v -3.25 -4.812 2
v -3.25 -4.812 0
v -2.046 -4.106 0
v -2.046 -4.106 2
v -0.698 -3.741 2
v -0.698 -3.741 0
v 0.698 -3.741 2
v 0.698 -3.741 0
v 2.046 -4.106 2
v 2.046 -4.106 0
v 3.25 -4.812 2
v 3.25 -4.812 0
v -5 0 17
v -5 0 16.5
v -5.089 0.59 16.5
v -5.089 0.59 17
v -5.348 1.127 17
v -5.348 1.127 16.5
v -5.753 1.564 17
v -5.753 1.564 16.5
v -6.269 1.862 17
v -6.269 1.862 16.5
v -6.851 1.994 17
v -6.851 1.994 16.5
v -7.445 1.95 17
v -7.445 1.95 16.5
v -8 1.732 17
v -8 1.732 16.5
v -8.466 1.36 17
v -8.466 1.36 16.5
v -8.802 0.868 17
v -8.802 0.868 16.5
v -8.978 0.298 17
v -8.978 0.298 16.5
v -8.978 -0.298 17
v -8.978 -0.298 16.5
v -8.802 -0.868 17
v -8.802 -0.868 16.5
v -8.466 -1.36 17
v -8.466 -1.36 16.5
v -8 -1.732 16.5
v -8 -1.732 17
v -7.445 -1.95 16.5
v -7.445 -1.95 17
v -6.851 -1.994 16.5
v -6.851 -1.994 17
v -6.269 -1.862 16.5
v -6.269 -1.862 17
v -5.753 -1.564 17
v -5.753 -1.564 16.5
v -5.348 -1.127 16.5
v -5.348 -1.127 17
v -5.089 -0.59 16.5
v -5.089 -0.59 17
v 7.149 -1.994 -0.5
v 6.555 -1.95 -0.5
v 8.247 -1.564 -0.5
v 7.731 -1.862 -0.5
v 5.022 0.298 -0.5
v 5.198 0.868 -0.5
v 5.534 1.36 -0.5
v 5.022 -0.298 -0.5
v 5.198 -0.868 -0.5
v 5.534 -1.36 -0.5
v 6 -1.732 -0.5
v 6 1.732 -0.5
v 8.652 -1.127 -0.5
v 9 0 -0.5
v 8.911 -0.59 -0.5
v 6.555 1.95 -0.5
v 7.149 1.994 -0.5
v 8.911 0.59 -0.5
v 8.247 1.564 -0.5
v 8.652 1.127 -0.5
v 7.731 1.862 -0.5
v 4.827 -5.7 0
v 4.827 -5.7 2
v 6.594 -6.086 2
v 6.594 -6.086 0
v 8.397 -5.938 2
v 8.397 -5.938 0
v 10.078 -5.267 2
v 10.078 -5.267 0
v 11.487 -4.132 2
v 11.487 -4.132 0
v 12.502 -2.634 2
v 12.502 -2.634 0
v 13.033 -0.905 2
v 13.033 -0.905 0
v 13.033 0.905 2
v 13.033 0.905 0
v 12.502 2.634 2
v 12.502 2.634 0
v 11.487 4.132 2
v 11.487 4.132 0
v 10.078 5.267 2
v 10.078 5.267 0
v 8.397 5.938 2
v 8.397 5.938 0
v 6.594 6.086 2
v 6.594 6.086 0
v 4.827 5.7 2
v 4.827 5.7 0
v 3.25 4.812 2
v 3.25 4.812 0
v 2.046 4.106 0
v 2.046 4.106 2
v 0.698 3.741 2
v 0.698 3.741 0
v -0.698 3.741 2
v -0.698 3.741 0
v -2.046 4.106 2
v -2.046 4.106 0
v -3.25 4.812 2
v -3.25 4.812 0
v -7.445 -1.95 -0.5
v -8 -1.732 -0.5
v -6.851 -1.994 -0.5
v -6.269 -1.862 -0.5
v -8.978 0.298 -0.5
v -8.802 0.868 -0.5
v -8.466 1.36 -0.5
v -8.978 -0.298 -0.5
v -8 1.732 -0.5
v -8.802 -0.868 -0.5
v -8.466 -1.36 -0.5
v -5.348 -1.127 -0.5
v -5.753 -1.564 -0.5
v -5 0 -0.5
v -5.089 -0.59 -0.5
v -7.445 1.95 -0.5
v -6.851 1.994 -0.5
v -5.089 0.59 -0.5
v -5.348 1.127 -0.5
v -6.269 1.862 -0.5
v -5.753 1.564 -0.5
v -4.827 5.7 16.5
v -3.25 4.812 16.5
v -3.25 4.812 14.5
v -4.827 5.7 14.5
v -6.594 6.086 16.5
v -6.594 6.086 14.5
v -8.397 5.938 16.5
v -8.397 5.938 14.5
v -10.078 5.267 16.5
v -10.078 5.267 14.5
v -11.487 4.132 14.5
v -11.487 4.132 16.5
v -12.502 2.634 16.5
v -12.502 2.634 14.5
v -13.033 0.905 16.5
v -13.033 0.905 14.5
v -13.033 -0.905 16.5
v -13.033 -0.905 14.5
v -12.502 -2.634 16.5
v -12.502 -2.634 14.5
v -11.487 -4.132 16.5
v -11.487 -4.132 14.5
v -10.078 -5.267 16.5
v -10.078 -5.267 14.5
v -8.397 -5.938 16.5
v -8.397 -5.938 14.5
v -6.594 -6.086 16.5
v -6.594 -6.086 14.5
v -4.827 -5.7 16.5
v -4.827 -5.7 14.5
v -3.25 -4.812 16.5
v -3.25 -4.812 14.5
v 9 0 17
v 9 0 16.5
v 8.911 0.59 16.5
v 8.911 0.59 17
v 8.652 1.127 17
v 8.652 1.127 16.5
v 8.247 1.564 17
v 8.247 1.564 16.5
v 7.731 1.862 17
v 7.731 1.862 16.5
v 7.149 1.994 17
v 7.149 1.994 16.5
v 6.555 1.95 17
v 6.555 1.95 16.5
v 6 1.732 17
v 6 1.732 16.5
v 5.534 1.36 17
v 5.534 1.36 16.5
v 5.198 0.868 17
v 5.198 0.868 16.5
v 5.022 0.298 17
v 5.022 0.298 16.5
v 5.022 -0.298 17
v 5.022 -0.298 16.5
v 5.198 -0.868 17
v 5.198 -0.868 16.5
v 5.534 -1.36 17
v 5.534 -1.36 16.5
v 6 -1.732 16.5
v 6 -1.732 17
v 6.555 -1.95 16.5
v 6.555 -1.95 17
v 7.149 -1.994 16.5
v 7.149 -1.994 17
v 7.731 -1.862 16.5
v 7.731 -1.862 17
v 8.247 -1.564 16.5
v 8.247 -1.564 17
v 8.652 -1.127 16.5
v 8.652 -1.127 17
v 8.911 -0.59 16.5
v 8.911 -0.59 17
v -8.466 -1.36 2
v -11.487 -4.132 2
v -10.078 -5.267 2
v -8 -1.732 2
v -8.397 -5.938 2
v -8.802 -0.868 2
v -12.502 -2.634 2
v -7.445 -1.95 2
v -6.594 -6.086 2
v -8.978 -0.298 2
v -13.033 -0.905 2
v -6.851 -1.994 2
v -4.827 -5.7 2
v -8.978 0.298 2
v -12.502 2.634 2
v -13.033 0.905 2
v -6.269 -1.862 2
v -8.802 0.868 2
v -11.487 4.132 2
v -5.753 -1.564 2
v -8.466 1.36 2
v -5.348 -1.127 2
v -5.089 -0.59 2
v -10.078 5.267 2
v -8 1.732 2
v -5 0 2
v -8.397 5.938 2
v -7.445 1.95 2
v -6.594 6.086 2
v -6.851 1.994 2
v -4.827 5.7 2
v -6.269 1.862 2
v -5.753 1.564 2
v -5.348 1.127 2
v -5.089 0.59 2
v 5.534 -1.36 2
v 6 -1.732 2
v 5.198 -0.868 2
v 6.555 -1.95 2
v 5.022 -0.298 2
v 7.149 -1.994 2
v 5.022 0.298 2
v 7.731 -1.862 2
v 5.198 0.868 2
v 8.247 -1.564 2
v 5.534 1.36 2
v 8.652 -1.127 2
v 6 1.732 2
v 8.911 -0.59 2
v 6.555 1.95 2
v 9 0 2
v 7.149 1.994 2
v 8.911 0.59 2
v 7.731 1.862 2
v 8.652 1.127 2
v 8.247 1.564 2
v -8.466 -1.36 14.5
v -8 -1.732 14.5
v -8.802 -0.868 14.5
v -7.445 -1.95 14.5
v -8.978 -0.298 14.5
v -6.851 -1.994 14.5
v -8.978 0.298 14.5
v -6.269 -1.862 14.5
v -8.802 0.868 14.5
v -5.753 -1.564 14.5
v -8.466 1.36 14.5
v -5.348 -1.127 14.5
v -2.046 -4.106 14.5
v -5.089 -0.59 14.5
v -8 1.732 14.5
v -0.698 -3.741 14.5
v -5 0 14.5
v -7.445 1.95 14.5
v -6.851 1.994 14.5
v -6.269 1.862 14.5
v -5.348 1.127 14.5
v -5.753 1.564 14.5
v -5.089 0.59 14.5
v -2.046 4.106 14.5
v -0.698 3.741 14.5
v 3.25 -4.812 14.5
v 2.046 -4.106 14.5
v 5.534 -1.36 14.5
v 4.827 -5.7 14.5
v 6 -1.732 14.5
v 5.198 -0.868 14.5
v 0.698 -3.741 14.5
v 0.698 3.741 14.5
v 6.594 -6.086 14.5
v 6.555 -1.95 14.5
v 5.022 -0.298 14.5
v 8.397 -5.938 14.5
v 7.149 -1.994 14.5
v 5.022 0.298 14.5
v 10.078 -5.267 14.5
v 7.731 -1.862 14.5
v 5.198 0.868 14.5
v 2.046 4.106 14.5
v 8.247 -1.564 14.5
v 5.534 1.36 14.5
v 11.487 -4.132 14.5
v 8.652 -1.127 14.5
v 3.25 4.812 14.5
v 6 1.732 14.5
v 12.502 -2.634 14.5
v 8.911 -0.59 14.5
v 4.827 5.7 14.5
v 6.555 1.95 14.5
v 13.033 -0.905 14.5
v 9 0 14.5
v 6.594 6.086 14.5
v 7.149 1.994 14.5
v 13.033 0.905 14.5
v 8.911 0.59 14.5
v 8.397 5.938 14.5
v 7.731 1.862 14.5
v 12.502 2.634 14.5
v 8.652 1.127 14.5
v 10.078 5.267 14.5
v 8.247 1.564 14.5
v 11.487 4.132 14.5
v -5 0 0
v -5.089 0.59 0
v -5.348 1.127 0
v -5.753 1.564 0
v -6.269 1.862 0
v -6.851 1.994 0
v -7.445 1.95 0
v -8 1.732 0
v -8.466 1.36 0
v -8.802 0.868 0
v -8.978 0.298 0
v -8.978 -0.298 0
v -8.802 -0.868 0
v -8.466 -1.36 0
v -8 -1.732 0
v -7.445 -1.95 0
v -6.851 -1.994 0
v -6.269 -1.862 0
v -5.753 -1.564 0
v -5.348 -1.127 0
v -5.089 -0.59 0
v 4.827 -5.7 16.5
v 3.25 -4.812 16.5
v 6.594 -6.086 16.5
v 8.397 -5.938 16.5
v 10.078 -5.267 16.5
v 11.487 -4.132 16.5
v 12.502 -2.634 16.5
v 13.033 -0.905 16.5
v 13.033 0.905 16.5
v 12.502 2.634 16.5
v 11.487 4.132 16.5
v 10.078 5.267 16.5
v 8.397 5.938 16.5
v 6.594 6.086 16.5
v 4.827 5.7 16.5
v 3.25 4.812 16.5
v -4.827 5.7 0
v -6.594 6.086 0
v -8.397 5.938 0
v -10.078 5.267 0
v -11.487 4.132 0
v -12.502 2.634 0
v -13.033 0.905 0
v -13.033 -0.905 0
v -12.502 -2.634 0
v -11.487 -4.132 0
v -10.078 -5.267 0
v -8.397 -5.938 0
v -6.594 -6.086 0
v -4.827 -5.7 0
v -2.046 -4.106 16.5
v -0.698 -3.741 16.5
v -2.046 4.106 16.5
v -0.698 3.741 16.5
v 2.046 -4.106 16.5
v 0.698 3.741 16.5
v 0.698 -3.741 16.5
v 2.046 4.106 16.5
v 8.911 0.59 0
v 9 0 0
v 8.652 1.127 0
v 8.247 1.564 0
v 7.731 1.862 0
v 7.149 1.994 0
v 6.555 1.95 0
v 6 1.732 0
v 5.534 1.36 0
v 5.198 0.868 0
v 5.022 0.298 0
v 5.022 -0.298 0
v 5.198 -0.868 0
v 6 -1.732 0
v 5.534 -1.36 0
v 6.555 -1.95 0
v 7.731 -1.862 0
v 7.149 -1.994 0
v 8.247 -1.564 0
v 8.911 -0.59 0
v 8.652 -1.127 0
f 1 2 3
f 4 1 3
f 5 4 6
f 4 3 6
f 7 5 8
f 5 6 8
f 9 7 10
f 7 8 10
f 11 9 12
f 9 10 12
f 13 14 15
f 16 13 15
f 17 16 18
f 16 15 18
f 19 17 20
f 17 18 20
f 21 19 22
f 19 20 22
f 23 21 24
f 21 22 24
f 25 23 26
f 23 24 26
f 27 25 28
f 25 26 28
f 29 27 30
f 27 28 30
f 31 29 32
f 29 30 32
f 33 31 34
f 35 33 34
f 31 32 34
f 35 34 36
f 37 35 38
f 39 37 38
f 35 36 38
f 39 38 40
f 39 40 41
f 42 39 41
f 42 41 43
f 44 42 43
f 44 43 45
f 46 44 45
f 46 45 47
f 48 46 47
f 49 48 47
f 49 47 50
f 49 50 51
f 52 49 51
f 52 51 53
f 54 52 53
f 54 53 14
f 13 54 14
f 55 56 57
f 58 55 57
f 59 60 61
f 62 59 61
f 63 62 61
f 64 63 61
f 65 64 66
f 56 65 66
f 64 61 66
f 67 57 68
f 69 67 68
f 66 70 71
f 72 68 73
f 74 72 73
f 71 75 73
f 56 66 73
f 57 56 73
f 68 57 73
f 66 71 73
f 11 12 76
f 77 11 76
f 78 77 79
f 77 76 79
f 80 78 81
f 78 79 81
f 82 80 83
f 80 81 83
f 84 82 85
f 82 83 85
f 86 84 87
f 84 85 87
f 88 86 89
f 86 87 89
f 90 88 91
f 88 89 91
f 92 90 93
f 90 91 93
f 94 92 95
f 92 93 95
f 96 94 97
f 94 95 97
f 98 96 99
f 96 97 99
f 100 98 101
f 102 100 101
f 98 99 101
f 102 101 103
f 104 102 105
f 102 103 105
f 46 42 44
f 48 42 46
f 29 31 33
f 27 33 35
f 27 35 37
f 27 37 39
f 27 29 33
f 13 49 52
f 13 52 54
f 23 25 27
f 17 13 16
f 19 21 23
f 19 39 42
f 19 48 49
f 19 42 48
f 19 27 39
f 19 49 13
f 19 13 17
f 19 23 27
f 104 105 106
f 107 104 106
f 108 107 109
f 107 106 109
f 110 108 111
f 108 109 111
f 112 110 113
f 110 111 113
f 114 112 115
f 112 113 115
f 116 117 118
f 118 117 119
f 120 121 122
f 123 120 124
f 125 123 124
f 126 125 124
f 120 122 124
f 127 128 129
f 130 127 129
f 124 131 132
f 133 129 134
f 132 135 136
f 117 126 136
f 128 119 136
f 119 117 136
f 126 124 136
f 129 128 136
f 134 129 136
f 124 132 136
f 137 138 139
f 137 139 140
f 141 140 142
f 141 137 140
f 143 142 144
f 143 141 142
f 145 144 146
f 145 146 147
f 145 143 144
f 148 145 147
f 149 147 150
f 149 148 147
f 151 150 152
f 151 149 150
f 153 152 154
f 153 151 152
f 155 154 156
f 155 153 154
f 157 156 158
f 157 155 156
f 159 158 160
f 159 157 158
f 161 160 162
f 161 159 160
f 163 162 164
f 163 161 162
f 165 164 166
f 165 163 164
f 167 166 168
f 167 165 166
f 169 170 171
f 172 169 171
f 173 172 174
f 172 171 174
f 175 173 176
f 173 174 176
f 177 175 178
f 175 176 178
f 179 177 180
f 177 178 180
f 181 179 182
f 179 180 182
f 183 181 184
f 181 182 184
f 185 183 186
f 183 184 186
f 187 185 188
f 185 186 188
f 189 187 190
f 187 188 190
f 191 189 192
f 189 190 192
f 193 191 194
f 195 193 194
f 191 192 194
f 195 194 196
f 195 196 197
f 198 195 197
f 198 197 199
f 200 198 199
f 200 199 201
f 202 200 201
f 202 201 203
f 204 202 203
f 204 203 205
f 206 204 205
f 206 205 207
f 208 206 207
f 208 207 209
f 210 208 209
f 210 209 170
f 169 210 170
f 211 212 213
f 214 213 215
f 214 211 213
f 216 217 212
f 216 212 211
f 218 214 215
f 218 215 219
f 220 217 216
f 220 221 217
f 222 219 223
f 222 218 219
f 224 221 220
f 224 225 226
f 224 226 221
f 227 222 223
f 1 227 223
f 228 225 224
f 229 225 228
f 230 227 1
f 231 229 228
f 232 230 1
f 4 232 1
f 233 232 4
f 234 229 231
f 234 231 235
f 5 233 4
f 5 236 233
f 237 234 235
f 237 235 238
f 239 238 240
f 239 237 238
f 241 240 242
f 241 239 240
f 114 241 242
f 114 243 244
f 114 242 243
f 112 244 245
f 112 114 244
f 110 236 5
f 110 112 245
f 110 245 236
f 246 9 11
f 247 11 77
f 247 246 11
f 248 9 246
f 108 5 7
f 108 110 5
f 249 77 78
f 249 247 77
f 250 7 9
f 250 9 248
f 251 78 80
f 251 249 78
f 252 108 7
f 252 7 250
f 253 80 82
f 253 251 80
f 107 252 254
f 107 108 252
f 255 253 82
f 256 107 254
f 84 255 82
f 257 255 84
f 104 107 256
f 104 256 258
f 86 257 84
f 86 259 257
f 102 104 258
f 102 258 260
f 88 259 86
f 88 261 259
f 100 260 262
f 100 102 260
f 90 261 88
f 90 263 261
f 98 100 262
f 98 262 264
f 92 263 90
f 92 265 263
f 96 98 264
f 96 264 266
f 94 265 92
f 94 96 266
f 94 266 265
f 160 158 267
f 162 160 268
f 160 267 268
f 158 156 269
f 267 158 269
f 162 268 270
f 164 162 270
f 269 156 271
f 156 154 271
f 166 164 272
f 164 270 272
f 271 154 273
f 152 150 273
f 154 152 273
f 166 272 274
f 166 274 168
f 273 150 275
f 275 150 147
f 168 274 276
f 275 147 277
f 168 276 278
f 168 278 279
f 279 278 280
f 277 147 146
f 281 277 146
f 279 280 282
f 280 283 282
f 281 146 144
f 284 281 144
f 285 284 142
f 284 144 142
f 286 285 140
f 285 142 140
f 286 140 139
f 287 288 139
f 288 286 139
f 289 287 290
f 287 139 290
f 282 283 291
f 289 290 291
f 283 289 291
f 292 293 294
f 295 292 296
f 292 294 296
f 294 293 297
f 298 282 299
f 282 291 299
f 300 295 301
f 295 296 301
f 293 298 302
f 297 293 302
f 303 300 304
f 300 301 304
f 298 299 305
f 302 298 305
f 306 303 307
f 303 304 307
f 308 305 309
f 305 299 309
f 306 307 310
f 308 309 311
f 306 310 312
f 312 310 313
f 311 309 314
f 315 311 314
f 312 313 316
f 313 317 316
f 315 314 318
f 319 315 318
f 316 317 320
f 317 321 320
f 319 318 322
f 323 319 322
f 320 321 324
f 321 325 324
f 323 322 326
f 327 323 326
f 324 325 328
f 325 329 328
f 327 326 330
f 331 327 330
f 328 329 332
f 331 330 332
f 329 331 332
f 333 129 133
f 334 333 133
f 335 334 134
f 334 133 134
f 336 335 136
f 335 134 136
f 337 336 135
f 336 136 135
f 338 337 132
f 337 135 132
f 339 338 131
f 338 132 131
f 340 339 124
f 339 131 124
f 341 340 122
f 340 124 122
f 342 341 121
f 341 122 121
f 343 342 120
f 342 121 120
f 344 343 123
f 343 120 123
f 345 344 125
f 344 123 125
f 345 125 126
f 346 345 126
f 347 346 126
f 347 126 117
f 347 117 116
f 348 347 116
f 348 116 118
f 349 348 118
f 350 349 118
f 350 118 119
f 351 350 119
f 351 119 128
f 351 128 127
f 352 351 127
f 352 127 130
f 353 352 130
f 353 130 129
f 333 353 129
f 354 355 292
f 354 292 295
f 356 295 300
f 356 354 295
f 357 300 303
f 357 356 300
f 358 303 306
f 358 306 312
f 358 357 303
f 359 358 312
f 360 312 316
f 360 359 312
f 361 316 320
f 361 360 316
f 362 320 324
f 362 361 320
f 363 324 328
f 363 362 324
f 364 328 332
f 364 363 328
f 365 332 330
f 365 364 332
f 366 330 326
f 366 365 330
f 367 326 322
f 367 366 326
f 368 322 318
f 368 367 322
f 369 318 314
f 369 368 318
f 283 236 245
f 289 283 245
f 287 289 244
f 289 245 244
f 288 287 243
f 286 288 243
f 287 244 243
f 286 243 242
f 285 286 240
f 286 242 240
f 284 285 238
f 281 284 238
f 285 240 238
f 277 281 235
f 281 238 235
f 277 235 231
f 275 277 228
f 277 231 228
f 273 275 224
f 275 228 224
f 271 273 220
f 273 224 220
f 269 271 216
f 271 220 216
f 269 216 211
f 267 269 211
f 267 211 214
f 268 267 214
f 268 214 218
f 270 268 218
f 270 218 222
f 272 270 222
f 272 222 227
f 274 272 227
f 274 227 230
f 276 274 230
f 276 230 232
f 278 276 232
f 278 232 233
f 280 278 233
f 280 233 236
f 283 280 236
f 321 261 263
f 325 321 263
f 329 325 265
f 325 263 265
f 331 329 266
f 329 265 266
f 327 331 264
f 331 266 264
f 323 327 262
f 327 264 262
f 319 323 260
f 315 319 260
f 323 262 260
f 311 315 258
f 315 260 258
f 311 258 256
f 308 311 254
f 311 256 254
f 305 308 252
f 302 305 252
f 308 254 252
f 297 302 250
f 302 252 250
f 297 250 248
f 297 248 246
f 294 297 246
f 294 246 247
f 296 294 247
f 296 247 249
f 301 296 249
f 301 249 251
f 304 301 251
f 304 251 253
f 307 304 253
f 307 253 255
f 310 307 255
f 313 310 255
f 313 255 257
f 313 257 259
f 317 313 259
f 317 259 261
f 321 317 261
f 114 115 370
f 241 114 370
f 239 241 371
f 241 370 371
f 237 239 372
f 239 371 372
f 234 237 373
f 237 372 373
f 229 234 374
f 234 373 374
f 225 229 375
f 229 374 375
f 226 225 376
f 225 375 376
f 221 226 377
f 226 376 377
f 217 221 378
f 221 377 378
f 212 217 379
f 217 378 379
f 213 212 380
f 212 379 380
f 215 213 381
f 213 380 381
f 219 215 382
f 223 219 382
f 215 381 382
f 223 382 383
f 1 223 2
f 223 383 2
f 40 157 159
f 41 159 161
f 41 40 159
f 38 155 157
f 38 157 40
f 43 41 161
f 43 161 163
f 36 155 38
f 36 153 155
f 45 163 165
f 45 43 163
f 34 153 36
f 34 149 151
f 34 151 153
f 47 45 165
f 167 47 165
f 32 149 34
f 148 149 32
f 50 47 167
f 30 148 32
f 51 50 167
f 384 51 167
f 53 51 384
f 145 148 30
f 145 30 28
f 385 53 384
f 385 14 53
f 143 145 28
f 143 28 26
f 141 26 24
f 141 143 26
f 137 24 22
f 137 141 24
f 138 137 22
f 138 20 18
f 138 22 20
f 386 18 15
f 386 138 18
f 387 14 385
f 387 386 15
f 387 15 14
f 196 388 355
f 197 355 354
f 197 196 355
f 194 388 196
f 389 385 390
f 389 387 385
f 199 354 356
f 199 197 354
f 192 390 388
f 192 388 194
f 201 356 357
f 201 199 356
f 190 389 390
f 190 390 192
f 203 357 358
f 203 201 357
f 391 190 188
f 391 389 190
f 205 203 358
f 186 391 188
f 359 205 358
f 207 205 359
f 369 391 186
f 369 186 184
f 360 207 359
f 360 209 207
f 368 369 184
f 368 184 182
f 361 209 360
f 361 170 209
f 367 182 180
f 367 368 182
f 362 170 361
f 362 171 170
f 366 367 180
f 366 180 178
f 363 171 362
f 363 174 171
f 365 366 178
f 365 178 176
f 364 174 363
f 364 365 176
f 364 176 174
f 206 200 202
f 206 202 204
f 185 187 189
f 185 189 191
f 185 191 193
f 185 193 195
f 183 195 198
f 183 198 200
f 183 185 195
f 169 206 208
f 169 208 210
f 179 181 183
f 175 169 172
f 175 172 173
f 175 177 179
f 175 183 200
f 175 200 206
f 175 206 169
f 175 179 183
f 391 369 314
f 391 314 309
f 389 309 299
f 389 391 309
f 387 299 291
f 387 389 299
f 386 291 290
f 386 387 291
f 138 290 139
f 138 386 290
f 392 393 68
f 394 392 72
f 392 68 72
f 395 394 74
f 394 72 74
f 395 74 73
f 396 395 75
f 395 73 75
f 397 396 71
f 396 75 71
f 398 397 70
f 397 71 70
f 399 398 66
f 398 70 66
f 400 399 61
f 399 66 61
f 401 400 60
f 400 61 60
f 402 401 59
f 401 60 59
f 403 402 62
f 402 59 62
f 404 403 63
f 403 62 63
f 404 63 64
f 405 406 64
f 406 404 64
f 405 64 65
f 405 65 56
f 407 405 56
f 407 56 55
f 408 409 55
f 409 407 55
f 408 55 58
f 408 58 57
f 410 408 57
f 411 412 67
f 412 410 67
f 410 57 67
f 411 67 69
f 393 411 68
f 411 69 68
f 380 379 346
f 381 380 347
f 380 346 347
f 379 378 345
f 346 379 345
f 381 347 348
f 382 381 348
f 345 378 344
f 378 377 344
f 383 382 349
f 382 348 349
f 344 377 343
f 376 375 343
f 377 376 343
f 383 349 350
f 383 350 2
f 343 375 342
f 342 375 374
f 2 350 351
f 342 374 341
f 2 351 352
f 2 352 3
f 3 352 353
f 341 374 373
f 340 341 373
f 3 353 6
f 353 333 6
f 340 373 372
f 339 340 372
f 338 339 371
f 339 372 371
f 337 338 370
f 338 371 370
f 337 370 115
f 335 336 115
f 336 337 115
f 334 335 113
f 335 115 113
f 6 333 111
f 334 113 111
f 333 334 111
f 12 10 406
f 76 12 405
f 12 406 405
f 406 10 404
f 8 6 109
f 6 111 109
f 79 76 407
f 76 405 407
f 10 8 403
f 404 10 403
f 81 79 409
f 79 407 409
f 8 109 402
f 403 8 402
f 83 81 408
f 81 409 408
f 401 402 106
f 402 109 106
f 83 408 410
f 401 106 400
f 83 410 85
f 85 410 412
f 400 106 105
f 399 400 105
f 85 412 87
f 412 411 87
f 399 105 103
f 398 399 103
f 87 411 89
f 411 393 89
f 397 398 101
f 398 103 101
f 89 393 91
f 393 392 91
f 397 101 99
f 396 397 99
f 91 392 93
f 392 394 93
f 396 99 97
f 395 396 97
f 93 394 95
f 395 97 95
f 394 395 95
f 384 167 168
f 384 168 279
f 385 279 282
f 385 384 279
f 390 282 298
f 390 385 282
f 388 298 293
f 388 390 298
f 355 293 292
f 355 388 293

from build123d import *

# Parameters (mm, degrees)
CROQUIS1_R                   = 2
SALIENTE_EXTRUIR1_DEPTH      = 2
SALIENTE_EXTRUIR2_DEPTH      = 15
SALIENTE_EXTRUIR2_DEPTH_BACK = 2.5
CROQUIS2_R                   = 2


with BuildPart() as part:
    # Croquis1 → Saliente-Extruir1 (new body)
    with BuildSketch(Plane.XY):
        with BuildLine():
            ThreePointArc((-3.250445743, 4.811532279), (-13.1, 0), (-3.250445743, -4.811532279))
            ThreePointArc((-3.250445743, -4.811532279), (0, -3.694574334), (3.250445743, -4.811532279))
            ThreePointArc((3.250445743, -4.811532279), (13.1, 0), (3.250445743, 4.811532279))
            ThreePointArc((3.250445743, 4.811532279), (0, 3.694574334), (-3.250445743, 4.811532279))
        make_face()
        with Locations((-7, 0)):
            Circle(CROQUIS1_R, mode=Mode.SUBTRACT)
        with Locations(Location((7, 0, 0), (0, 0, 180))):
            Circle(CROQUIS1_R, mode=Mode.SUBTRACT)
    saliente_extruir1 = extrude(amount=SALIENTE_EXTRUIR1_DEPTH)

    # Croquis2 → Saliente-Extruir2 (add, two sides: drawn at the far end of the back side and taken through both)
    with BuildSketch(Plane.XY.offset(2).offset(-SALIENTE_EXTRUIR2_DEPTH_BACK)):
        with Locations((7, 0)):
            Circle(CROQUIS2_R)
        with Locations((-7, 0)):
            Circle(CROQUIS2_R)
    extrude(amount=SALIENTE_EXTRUIR2_DEPTH + SALIENTE_EXTRUIR2_DEPTH_BACK)

    # Simetría1: Saliente-Extruir1 across plane
    add(saliente_extruir1.mirror(Plane.XY.offset(8.25)))


solid = part.part
